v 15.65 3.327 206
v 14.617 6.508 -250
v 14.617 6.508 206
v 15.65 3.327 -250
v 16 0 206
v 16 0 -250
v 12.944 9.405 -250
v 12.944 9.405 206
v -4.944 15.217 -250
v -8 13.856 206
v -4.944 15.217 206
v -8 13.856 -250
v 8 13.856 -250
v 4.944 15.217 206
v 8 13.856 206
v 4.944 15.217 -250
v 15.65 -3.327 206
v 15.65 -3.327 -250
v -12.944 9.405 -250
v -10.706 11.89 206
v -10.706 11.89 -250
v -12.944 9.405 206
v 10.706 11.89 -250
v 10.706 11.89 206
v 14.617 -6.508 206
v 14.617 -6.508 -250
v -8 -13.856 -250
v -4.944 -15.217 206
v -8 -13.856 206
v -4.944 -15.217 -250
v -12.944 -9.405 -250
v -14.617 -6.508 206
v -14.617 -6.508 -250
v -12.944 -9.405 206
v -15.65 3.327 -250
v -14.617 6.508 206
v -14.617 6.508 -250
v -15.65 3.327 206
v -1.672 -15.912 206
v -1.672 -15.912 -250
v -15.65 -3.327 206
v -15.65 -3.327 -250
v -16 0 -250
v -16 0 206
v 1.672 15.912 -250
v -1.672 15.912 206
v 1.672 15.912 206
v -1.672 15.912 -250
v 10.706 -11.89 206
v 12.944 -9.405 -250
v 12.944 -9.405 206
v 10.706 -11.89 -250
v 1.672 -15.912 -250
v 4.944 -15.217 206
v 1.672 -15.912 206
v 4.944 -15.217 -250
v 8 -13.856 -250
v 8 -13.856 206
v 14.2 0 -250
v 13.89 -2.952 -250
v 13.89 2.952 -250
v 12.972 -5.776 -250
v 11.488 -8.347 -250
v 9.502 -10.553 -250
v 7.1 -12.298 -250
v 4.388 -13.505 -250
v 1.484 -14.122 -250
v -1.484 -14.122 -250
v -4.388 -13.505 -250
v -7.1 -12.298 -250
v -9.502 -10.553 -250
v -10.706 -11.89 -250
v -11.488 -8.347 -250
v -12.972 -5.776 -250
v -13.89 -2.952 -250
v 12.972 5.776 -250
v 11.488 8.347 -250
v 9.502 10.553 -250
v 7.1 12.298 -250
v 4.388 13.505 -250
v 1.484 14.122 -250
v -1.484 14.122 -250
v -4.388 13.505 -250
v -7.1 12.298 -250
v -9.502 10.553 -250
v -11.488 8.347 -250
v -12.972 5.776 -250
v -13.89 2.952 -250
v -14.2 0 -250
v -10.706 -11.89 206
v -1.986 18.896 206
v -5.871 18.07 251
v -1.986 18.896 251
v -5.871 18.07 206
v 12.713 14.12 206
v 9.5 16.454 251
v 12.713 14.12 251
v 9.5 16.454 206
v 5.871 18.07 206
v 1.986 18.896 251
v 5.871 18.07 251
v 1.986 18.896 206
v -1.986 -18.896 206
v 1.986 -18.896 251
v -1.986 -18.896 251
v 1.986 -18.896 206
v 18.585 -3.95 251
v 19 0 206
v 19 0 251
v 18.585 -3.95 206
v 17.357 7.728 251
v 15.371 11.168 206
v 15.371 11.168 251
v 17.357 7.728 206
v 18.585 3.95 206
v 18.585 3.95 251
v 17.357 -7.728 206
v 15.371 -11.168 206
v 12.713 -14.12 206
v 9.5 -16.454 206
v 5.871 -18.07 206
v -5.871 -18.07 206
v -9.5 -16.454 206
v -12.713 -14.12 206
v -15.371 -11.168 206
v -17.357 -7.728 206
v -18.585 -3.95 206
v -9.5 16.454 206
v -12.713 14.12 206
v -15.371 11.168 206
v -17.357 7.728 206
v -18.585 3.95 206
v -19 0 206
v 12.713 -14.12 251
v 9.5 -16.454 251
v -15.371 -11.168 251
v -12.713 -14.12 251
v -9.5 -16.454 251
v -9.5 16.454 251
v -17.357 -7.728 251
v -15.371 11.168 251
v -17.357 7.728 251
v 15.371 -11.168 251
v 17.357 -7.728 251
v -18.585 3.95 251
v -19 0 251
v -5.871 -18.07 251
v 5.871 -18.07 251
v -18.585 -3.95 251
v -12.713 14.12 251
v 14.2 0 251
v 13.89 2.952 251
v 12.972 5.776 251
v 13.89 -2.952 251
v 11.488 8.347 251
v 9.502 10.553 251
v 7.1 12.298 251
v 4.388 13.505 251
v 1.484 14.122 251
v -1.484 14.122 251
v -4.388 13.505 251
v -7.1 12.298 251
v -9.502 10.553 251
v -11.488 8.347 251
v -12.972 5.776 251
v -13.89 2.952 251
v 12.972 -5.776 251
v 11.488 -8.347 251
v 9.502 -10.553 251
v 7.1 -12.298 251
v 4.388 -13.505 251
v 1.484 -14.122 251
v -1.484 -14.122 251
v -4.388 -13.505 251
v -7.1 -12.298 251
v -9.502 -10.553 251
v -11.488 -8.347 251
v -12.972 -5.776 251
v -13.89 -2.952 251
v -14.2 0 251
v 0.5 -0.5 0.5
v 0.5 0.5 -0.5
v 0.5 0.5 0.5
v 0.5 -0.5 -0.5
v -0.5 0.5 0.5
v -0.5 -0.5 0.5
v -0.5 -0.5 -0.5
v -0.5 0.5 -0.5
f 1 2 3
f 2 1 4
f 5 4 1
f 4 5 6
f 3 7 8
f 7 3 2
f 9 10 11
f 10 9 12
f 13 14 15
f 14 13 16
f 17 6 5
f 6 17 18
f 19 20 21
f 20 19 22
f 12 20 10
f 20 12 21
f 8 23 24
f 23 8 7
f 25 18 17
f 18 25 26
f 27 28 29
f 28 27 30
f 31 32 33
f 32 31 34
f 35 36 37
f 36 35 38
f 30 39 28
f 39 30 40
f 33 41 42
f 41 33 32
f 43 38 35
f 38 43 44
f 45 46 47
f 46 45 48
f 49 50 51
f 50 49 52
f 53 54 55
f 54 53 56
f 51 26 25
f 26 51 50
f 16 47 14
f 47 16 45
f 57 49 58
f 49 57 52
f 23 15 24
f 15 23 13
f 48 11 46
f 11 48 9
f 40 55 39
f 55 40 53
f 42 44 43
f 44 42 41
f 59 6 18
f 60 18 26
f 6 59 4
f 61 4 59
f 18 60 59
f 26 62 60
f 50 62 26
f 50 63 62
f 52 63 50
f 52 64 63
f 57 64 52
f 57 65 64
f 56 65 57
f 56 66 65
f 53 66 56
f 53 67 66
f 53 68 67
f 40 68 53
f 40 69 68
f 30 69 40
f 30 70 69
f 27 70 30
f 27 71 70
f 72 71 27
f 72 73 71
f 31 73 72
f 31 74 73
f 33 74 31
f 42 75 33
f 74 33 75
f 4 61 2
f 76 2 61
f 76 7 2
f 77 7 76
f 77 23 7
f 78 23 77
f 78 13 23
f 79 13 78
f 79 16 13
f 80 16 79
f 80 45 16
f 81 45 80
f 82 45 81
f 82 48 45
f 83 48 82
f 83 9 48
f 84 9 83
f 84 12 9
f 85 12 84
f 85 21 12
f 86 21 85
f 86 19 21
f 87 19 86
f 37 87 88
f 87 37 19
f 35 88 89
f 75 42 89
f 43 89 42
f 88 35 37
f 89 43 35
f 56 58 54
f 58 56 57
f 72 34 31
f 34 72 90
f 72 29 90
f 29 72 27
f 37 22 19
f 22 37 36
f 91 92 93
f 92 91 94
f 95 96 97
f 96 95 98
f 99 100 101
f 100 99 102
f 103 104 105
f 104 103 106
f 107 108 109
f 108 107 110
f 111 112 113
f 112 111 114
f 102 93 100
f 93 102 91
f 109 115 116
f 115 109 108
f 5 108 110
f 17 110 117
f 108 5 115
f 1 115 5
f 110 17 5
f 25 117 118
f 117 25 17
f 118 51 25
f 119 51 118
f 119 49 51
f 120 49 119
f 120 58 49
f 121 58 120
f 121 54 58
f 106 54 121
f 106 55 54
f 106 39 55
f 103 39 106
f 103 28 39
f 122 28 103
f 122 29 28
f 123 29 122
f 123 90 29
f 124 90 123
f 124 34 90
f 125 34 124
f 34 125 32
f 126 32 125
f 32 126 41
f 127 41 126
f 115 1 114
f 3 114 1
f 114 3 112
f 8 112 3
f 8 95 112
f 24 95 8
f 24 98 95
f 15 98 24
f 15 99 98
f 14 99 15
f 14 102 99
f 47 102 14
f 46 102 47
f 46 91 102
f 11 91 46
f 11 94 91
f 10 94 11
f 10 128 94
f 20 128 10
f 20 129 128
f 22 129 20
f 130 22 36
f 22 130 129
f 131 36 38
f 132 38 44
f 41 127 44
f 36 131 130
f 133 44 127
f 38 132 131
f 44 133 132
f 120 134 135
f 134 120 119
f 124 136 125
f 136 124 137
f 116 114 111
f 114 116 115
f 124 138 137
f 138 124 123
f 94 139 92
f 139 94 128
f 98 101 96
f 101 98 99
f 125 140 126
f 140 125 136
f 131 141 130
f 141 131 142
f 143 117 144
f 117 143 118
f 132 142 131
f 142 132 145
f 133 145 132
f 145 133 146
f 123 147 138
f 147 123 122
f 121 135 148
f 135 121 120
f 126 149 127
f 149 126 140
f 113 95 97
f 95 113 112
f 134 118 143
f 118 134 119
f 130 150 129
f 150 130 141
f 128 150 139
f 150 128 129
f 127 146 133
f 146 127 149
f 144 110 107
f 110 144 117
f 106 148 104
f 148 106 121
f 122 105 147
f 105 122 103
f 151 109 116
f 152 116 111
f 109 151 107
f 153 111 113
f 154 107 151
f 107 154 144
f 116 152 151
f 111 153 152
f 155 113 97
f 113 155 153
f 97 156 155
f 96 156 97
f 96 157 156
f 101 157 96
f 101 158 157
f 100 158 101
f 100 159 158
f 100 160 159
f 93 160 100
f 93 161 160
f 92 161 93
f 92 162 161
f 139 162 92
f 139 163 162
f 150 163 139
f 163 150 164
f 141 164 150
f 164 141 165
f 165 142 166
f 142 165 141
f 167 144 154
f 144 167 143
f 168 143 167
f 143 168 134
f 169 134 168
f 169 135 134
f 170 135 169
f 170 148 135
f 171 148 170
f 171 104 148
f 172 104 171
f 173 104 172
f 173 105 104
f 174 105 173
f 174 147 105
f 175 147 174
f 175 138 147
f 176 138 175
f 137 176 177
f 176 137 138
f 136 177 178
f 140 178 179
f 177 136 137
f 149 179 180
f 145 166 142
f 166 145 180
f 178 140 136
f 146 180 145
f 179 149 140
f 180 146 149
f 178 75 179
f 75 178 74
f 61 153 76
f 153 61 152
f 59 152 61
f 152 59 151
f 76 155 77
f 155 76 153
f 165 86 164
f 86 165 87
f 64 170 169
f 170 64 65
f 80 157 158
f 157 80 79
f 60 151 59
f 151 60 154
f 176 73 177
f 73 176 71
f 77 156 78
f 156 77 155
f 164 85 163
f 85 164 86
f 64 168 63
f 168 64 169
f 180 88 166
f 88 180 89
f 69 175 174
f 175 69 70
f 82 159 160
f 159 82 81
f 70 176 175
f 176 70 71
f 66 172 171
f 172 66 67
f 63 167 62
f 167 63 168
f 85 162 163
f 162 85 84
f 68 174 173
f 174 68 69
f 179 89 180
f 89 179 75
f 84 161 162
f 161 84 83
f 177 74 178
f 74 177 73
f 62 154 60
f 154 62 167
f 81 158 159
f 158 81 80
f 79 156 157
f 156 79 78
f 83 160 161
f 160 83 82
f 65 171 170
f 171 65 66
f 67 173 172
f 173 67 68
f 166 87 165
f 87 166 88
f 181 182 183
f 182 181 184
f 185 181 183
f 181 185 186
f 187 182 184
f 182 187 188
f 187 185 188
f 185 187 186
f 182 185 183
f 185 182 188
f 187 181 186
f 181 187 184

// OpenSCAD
// Parameters
pipe_length = 500; //[250:1000:1]
outer_diameter = 32; //[16:64:0.1]
wall_thickness = 1.8; //[0.9:3.6:0.1]
inner_diameter = 28.4; //[14.2:56.8:0.1]
socket_length = 45; //[20:90:1]
socket_outer_diameter = 38; //[32:60:0.1]
chamfer_length = 2; //[0.5:6:0.1]
overlap = 1; //[0.5:2:0.1]

// Base Shapes
module pipe_body() {
  cylinder(h=pipe_length, r=outer_diameter/2, center=true);
}

module inner_bore() {
  cylinder(h=pipe_length + 2*overlap, r=inner_diameter/2, center=true);
}

module socket_end() {
  translate([0, 0, pipe_length/2 - socket_length/2 + overlap])
    cylinder(h=socket_length, r=socket_outer_diameter/2, center=true);
}

module chamfered_ends() {
  translate([0, 0, -pipe_length/2 + chamfer_length/2 - overlap])
    rotate([180, 0, 0])
    cylinder(h=chamfer_length, r1=outer_diameter/2, r2=0, center=true);
}

module markings_text() {
  // Placeholder for markings, represented as a small cube
  translate([0, 0, 0])
    cube([overlap, overlap, overlap], center=true);
}

// Operations
module pipe_with_socket() {
  union() {
    pipe_body();
    socket_end();
  }
}

module pipe_with_socket_and_chamfer() {
  union() {
    pipe_with_socket();
    chamfered_ends();
  }
}

module pipe_hollowed() {
  difference() {
    pipe_with_socket_and_chamfer();
    inner_bore();
  }
}

module final_model() {
  union() {
    pipe_hollowed();
    markings_text();
  }
}

// Final Output
final_model();
